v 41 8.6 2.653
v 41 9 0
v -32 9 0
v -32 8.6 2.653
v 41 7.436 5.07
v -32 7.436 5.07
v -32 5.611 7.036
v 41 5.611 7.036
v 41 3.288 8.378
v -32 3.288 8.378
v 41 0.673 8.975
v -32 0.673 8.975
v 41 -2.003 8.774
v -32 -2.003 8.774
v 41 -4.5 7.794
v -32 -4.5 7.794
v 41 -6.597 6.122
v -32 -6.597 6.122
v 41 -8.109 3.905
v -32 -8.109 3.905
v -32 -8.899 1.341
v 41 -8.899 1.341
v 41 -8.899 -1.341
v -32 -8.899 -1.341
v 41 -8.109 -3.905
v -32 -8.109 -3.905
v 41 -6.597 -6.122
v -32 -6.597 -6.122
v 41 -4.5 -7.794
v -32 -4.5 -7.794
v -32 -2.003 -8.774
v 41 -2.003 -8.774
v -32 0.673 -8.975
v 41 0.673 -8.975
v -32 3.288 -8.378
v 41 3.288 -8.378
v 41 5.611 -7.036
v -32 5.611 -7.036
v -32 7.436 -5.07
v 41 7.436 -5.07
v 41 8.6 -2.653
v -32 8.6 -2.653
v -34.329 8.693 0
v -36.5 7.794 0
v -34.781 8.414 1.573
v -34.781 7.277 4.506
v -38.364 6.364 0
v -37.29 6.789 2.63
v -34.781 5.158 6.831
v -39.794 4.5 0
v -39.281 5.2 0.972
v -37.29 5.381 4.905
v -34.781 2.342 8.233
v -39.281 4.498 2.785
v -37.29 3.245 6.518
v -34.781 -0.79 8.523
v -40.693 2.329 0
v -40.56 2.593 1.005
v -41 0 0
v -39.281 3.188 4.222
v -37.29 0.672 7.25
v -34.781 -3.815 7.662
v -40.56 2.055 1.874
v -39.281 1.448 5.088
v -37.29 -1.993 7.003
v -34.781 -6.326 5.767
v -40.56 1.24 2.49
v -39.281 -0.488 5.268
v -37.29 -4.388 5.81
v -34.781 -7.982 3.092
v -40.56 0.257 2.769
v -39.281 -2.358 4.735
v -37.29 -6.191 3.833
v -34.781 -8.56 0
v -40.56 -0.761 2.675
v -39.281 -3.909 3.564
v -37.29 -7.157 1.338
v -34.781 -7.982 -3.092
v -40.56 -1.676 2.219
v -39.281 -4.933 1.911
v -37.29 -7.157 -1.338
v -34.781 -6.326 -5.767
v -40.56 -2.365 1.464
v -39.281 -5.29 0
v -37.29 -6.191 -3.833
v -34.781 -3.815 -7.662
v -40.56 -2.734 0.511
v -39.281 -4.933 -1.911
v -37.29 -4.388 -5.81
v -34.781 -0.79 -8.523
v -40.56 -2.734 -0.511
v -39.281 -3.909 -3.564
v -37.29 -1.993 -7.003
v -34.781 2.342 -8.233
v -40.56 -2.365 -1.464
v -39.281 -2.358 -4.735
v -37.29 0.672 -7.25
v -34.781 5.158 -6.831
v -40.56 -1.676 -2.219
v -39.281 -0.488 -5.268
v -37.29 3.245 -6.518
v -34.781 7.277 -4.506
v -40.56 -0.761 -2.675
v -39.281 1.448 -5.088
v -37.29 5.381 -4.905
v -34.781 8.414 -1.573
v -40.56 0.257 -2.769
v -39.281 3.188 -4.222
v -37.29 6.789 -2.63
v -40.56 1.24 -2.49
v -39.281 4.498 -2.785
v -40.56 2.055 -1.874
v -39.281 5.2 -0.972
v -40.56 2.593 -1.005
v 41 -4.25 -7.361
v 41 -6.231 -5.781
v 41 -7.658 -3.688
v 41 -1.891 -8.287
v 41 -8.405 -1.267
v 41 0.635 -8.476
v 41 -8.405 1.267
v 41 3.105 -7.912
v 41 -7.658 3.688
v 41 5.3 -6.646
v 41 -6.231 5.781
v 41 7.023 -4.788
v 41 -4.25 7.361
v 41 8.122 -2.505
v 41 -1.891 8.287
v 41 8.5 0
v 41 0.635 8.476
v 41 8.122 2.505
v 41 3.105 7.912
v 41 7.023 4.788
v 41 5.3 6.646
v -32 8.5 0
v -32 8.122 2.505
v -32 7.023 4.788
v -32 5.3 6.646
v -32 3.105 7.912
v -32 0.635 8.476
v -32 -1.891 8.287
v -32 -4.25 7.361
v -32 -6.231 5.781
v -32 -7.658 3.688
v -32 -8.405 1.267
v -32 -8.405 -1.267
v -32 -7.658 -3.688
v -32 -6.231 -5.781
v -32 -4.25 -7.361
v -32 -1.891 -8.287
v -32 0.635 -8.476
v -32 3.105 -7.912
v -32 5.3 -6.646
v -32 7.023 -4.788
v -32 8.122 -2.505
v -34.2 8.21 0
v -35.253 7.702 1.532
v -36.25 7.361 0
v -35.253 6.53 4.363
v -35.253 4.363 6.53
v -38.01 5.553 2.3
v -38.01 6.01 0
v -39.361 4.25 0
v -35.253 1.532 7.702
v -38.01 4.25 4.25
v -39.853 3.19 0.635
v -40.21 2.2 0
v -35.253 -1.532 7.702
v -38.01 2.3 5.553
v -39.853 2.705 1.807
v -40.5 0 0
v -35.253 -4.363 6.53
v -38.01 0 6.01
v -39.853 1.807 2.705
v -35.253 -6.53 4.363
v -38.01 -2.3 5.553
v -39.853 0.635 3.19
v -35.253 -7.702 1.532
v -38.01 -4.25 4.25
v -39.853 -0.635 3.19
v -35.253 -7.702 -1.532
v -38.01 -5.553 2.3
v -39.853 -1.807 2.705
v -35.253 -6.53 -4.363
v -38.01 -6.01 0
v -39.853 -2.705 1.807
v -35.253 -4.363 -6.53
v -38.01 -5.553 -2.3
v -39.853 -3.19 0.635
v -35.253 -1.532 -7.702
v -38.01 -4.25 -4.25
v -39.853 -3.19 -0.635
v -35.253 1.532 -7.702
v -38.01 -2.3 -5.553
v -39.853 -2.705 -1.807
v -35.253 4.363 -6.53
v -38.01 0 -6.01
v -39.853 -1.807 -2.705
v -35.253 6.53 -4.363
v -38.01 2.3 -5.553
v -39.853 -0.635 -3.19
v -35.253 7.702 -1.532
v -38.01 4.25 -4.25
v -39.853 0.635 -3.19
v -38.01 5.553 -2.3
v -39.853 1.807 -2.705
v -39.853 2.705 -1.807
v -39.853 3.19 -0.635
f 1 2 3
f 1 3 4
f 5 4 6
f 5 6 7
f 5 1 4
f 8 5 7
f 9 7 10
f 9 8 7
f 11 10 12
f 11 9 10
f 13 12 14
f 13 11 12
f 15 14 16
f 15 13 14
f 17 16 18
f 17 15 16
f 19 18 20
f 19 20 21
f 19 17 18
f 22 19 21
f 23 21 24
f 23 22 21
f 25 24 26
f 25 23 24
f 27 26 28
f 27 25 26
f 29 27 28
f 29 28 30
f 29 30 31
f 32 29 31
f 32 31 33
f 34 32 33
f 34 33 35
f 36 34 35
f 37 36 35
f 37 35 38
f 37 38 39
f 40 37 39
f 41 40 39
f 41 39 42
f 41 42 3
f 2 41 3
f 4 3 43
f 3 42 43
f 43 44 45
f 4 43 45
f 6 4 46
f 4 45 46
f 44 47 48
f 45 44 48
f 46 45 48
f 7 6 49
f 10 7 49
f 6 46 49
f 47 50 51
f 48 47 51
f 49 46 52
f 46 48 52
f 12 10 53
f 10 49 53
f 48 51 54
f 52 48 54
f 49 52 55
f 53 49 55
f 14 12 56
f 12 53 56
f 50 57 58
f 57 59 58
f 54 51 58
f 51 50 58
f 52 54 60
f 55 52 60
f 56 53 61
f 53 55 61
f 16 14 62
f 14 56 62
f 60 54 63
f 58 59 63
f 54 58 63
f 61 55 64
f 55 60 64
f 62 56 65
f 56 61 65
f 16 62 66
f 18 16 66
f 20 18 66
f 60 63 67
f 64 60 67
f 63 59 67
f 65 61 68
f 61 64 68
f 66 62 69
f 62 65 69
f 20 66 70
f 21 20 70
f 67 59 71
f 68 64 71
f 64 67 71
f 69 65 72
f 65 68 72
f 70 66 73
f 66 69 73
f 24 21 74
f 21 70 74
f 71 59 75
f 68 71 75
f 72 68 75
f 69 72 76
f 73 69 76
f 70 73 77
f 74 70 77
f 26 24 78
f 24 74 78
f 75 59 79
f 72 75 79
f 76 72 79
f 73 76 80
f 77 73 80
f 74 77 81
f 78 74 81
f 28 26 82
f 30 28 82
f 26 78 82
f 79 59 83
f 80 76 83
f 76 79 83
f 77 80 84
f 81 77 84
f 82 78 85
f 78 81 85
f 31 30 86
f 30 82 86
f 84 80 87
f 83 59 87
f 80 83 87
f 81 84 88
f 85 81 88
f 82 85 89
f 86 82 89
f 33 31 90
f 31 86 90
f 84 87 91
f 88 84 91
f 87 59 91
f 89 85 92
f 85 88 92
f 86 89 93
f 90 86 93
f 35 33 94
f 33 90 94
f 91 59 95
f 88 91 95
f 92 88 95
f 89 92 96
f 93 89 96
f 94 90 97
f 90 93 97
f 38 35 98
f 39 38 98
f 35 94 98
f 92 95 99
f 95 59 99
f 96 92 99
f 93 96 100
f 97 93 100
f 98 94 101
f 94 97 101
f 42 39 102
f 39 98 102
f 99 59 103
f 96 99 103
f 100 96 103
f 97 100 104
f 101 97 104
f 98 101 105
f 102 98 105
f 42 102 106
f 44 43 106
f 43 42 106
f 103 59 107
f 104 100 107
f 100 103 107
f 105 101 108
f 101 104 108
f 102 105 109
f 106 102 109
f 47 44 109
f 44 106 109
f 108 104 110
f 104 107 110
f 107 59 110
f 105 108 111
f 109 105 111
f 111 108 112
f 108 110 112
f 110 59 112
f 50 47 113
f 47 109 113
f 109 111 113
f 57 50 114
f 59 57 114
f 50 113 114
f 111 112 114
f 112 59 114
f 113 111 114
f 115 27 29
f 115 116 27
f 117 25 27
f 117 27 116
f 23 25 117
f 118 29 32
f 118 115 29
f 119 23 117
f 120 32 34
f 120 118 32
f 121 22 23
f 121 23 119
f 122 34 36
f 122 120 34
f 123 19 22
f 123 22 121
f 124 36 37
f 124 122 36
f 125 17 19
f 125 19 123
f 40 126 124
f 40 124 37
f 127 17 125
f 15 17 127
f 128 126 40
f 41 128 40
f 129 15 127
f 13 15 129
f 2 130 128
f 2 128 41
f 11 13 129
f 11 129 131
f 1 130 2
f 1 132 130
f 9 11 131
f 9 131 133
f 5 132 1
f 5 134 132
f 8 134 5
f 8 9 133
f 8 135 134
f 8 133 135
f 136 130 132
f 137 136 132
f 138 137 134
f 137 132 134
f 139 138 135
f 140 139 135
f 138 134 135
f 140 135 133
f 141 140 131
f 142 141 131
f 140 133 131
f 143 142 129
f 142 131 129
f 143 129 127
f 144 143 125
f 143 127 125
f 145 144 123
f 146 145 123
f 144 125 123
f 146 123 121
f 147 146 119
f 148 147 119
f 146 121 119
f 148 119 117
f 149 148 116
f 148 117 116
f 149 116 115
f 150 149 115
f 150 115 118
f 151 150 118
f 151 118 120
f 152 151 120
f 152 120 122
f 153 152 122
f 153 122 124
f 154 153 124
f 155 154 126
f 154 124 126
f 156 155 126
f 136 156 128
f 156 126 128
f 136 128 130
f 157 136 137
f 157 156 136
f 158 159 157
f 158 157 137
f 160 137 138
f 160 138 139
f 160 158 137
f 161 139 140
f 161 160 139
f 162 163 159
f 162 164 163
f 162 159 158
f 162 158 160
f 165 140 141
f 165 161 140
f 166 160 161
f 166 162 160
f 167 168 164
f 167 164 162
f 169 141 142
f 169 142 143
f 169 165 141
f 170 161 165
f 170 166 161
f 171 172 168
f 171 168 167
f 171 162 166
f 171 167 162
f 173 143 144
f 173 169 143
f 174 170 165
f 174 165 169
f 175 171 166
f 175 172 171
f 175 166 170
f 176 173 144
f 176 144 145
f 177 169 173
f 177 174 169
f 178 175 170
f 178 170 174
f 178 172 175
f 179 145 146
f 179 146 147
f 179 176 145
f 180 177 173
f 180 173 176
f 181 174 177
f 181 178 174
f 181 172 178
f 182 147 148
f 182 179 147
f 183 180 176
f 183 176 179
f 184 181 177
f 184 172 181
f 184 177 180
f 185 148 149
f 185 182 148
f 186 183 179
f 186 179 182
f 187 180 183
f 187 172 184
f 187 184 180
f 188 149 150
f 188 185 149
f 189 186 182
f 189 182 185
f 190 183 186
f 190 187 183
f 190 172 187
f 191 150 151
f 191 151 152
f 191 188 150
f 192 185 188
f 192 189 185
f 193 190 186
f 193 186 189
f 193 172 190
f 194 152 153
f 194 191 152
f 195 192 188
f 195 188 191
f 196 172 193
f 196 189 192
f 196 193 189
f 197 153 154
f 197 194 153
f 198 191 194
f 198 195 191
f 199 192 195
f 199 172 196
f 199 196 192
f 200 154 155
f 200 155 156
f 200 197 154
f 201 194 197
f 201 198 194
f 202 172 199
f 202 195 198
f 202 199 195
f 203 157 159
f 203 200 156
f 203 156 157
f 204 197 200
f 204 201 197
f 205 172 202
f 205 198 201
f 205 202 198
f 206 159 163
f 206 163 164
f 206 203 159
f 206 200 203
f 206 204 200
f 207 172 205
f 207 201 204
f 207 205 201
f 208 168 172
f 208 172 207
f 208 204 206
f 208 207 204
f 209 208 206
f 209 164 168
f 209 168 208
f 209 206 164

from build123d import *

# Parameters (mm, degrees)
F0_R     = 9
F1_DEPTH = 41
F2_R     = 9
F3_T     = -0.5


with BuildPart() as f1:
    # F0 (on Right) → F1 (new body, symmetric)
    with BuildSketch(Plane.YZ):
        Circle(F0_R)
    extrude(amount=F1_DEPTH, both=True)

    # F2
    f2_edges = [f1.edges().sort_by_distance(p)[0] for p in [
        (-41, -9, 0),
    ]]
    fillet(f2_edges, radius=F2_R)

    # F3
    f3_openings = [f1.faces().sort_by_distance(p)[0] for p in [
        (41, 0, 0),
    ]]
    offset(amount=F3_T, openings=f3_openings)


solid = f1.part
